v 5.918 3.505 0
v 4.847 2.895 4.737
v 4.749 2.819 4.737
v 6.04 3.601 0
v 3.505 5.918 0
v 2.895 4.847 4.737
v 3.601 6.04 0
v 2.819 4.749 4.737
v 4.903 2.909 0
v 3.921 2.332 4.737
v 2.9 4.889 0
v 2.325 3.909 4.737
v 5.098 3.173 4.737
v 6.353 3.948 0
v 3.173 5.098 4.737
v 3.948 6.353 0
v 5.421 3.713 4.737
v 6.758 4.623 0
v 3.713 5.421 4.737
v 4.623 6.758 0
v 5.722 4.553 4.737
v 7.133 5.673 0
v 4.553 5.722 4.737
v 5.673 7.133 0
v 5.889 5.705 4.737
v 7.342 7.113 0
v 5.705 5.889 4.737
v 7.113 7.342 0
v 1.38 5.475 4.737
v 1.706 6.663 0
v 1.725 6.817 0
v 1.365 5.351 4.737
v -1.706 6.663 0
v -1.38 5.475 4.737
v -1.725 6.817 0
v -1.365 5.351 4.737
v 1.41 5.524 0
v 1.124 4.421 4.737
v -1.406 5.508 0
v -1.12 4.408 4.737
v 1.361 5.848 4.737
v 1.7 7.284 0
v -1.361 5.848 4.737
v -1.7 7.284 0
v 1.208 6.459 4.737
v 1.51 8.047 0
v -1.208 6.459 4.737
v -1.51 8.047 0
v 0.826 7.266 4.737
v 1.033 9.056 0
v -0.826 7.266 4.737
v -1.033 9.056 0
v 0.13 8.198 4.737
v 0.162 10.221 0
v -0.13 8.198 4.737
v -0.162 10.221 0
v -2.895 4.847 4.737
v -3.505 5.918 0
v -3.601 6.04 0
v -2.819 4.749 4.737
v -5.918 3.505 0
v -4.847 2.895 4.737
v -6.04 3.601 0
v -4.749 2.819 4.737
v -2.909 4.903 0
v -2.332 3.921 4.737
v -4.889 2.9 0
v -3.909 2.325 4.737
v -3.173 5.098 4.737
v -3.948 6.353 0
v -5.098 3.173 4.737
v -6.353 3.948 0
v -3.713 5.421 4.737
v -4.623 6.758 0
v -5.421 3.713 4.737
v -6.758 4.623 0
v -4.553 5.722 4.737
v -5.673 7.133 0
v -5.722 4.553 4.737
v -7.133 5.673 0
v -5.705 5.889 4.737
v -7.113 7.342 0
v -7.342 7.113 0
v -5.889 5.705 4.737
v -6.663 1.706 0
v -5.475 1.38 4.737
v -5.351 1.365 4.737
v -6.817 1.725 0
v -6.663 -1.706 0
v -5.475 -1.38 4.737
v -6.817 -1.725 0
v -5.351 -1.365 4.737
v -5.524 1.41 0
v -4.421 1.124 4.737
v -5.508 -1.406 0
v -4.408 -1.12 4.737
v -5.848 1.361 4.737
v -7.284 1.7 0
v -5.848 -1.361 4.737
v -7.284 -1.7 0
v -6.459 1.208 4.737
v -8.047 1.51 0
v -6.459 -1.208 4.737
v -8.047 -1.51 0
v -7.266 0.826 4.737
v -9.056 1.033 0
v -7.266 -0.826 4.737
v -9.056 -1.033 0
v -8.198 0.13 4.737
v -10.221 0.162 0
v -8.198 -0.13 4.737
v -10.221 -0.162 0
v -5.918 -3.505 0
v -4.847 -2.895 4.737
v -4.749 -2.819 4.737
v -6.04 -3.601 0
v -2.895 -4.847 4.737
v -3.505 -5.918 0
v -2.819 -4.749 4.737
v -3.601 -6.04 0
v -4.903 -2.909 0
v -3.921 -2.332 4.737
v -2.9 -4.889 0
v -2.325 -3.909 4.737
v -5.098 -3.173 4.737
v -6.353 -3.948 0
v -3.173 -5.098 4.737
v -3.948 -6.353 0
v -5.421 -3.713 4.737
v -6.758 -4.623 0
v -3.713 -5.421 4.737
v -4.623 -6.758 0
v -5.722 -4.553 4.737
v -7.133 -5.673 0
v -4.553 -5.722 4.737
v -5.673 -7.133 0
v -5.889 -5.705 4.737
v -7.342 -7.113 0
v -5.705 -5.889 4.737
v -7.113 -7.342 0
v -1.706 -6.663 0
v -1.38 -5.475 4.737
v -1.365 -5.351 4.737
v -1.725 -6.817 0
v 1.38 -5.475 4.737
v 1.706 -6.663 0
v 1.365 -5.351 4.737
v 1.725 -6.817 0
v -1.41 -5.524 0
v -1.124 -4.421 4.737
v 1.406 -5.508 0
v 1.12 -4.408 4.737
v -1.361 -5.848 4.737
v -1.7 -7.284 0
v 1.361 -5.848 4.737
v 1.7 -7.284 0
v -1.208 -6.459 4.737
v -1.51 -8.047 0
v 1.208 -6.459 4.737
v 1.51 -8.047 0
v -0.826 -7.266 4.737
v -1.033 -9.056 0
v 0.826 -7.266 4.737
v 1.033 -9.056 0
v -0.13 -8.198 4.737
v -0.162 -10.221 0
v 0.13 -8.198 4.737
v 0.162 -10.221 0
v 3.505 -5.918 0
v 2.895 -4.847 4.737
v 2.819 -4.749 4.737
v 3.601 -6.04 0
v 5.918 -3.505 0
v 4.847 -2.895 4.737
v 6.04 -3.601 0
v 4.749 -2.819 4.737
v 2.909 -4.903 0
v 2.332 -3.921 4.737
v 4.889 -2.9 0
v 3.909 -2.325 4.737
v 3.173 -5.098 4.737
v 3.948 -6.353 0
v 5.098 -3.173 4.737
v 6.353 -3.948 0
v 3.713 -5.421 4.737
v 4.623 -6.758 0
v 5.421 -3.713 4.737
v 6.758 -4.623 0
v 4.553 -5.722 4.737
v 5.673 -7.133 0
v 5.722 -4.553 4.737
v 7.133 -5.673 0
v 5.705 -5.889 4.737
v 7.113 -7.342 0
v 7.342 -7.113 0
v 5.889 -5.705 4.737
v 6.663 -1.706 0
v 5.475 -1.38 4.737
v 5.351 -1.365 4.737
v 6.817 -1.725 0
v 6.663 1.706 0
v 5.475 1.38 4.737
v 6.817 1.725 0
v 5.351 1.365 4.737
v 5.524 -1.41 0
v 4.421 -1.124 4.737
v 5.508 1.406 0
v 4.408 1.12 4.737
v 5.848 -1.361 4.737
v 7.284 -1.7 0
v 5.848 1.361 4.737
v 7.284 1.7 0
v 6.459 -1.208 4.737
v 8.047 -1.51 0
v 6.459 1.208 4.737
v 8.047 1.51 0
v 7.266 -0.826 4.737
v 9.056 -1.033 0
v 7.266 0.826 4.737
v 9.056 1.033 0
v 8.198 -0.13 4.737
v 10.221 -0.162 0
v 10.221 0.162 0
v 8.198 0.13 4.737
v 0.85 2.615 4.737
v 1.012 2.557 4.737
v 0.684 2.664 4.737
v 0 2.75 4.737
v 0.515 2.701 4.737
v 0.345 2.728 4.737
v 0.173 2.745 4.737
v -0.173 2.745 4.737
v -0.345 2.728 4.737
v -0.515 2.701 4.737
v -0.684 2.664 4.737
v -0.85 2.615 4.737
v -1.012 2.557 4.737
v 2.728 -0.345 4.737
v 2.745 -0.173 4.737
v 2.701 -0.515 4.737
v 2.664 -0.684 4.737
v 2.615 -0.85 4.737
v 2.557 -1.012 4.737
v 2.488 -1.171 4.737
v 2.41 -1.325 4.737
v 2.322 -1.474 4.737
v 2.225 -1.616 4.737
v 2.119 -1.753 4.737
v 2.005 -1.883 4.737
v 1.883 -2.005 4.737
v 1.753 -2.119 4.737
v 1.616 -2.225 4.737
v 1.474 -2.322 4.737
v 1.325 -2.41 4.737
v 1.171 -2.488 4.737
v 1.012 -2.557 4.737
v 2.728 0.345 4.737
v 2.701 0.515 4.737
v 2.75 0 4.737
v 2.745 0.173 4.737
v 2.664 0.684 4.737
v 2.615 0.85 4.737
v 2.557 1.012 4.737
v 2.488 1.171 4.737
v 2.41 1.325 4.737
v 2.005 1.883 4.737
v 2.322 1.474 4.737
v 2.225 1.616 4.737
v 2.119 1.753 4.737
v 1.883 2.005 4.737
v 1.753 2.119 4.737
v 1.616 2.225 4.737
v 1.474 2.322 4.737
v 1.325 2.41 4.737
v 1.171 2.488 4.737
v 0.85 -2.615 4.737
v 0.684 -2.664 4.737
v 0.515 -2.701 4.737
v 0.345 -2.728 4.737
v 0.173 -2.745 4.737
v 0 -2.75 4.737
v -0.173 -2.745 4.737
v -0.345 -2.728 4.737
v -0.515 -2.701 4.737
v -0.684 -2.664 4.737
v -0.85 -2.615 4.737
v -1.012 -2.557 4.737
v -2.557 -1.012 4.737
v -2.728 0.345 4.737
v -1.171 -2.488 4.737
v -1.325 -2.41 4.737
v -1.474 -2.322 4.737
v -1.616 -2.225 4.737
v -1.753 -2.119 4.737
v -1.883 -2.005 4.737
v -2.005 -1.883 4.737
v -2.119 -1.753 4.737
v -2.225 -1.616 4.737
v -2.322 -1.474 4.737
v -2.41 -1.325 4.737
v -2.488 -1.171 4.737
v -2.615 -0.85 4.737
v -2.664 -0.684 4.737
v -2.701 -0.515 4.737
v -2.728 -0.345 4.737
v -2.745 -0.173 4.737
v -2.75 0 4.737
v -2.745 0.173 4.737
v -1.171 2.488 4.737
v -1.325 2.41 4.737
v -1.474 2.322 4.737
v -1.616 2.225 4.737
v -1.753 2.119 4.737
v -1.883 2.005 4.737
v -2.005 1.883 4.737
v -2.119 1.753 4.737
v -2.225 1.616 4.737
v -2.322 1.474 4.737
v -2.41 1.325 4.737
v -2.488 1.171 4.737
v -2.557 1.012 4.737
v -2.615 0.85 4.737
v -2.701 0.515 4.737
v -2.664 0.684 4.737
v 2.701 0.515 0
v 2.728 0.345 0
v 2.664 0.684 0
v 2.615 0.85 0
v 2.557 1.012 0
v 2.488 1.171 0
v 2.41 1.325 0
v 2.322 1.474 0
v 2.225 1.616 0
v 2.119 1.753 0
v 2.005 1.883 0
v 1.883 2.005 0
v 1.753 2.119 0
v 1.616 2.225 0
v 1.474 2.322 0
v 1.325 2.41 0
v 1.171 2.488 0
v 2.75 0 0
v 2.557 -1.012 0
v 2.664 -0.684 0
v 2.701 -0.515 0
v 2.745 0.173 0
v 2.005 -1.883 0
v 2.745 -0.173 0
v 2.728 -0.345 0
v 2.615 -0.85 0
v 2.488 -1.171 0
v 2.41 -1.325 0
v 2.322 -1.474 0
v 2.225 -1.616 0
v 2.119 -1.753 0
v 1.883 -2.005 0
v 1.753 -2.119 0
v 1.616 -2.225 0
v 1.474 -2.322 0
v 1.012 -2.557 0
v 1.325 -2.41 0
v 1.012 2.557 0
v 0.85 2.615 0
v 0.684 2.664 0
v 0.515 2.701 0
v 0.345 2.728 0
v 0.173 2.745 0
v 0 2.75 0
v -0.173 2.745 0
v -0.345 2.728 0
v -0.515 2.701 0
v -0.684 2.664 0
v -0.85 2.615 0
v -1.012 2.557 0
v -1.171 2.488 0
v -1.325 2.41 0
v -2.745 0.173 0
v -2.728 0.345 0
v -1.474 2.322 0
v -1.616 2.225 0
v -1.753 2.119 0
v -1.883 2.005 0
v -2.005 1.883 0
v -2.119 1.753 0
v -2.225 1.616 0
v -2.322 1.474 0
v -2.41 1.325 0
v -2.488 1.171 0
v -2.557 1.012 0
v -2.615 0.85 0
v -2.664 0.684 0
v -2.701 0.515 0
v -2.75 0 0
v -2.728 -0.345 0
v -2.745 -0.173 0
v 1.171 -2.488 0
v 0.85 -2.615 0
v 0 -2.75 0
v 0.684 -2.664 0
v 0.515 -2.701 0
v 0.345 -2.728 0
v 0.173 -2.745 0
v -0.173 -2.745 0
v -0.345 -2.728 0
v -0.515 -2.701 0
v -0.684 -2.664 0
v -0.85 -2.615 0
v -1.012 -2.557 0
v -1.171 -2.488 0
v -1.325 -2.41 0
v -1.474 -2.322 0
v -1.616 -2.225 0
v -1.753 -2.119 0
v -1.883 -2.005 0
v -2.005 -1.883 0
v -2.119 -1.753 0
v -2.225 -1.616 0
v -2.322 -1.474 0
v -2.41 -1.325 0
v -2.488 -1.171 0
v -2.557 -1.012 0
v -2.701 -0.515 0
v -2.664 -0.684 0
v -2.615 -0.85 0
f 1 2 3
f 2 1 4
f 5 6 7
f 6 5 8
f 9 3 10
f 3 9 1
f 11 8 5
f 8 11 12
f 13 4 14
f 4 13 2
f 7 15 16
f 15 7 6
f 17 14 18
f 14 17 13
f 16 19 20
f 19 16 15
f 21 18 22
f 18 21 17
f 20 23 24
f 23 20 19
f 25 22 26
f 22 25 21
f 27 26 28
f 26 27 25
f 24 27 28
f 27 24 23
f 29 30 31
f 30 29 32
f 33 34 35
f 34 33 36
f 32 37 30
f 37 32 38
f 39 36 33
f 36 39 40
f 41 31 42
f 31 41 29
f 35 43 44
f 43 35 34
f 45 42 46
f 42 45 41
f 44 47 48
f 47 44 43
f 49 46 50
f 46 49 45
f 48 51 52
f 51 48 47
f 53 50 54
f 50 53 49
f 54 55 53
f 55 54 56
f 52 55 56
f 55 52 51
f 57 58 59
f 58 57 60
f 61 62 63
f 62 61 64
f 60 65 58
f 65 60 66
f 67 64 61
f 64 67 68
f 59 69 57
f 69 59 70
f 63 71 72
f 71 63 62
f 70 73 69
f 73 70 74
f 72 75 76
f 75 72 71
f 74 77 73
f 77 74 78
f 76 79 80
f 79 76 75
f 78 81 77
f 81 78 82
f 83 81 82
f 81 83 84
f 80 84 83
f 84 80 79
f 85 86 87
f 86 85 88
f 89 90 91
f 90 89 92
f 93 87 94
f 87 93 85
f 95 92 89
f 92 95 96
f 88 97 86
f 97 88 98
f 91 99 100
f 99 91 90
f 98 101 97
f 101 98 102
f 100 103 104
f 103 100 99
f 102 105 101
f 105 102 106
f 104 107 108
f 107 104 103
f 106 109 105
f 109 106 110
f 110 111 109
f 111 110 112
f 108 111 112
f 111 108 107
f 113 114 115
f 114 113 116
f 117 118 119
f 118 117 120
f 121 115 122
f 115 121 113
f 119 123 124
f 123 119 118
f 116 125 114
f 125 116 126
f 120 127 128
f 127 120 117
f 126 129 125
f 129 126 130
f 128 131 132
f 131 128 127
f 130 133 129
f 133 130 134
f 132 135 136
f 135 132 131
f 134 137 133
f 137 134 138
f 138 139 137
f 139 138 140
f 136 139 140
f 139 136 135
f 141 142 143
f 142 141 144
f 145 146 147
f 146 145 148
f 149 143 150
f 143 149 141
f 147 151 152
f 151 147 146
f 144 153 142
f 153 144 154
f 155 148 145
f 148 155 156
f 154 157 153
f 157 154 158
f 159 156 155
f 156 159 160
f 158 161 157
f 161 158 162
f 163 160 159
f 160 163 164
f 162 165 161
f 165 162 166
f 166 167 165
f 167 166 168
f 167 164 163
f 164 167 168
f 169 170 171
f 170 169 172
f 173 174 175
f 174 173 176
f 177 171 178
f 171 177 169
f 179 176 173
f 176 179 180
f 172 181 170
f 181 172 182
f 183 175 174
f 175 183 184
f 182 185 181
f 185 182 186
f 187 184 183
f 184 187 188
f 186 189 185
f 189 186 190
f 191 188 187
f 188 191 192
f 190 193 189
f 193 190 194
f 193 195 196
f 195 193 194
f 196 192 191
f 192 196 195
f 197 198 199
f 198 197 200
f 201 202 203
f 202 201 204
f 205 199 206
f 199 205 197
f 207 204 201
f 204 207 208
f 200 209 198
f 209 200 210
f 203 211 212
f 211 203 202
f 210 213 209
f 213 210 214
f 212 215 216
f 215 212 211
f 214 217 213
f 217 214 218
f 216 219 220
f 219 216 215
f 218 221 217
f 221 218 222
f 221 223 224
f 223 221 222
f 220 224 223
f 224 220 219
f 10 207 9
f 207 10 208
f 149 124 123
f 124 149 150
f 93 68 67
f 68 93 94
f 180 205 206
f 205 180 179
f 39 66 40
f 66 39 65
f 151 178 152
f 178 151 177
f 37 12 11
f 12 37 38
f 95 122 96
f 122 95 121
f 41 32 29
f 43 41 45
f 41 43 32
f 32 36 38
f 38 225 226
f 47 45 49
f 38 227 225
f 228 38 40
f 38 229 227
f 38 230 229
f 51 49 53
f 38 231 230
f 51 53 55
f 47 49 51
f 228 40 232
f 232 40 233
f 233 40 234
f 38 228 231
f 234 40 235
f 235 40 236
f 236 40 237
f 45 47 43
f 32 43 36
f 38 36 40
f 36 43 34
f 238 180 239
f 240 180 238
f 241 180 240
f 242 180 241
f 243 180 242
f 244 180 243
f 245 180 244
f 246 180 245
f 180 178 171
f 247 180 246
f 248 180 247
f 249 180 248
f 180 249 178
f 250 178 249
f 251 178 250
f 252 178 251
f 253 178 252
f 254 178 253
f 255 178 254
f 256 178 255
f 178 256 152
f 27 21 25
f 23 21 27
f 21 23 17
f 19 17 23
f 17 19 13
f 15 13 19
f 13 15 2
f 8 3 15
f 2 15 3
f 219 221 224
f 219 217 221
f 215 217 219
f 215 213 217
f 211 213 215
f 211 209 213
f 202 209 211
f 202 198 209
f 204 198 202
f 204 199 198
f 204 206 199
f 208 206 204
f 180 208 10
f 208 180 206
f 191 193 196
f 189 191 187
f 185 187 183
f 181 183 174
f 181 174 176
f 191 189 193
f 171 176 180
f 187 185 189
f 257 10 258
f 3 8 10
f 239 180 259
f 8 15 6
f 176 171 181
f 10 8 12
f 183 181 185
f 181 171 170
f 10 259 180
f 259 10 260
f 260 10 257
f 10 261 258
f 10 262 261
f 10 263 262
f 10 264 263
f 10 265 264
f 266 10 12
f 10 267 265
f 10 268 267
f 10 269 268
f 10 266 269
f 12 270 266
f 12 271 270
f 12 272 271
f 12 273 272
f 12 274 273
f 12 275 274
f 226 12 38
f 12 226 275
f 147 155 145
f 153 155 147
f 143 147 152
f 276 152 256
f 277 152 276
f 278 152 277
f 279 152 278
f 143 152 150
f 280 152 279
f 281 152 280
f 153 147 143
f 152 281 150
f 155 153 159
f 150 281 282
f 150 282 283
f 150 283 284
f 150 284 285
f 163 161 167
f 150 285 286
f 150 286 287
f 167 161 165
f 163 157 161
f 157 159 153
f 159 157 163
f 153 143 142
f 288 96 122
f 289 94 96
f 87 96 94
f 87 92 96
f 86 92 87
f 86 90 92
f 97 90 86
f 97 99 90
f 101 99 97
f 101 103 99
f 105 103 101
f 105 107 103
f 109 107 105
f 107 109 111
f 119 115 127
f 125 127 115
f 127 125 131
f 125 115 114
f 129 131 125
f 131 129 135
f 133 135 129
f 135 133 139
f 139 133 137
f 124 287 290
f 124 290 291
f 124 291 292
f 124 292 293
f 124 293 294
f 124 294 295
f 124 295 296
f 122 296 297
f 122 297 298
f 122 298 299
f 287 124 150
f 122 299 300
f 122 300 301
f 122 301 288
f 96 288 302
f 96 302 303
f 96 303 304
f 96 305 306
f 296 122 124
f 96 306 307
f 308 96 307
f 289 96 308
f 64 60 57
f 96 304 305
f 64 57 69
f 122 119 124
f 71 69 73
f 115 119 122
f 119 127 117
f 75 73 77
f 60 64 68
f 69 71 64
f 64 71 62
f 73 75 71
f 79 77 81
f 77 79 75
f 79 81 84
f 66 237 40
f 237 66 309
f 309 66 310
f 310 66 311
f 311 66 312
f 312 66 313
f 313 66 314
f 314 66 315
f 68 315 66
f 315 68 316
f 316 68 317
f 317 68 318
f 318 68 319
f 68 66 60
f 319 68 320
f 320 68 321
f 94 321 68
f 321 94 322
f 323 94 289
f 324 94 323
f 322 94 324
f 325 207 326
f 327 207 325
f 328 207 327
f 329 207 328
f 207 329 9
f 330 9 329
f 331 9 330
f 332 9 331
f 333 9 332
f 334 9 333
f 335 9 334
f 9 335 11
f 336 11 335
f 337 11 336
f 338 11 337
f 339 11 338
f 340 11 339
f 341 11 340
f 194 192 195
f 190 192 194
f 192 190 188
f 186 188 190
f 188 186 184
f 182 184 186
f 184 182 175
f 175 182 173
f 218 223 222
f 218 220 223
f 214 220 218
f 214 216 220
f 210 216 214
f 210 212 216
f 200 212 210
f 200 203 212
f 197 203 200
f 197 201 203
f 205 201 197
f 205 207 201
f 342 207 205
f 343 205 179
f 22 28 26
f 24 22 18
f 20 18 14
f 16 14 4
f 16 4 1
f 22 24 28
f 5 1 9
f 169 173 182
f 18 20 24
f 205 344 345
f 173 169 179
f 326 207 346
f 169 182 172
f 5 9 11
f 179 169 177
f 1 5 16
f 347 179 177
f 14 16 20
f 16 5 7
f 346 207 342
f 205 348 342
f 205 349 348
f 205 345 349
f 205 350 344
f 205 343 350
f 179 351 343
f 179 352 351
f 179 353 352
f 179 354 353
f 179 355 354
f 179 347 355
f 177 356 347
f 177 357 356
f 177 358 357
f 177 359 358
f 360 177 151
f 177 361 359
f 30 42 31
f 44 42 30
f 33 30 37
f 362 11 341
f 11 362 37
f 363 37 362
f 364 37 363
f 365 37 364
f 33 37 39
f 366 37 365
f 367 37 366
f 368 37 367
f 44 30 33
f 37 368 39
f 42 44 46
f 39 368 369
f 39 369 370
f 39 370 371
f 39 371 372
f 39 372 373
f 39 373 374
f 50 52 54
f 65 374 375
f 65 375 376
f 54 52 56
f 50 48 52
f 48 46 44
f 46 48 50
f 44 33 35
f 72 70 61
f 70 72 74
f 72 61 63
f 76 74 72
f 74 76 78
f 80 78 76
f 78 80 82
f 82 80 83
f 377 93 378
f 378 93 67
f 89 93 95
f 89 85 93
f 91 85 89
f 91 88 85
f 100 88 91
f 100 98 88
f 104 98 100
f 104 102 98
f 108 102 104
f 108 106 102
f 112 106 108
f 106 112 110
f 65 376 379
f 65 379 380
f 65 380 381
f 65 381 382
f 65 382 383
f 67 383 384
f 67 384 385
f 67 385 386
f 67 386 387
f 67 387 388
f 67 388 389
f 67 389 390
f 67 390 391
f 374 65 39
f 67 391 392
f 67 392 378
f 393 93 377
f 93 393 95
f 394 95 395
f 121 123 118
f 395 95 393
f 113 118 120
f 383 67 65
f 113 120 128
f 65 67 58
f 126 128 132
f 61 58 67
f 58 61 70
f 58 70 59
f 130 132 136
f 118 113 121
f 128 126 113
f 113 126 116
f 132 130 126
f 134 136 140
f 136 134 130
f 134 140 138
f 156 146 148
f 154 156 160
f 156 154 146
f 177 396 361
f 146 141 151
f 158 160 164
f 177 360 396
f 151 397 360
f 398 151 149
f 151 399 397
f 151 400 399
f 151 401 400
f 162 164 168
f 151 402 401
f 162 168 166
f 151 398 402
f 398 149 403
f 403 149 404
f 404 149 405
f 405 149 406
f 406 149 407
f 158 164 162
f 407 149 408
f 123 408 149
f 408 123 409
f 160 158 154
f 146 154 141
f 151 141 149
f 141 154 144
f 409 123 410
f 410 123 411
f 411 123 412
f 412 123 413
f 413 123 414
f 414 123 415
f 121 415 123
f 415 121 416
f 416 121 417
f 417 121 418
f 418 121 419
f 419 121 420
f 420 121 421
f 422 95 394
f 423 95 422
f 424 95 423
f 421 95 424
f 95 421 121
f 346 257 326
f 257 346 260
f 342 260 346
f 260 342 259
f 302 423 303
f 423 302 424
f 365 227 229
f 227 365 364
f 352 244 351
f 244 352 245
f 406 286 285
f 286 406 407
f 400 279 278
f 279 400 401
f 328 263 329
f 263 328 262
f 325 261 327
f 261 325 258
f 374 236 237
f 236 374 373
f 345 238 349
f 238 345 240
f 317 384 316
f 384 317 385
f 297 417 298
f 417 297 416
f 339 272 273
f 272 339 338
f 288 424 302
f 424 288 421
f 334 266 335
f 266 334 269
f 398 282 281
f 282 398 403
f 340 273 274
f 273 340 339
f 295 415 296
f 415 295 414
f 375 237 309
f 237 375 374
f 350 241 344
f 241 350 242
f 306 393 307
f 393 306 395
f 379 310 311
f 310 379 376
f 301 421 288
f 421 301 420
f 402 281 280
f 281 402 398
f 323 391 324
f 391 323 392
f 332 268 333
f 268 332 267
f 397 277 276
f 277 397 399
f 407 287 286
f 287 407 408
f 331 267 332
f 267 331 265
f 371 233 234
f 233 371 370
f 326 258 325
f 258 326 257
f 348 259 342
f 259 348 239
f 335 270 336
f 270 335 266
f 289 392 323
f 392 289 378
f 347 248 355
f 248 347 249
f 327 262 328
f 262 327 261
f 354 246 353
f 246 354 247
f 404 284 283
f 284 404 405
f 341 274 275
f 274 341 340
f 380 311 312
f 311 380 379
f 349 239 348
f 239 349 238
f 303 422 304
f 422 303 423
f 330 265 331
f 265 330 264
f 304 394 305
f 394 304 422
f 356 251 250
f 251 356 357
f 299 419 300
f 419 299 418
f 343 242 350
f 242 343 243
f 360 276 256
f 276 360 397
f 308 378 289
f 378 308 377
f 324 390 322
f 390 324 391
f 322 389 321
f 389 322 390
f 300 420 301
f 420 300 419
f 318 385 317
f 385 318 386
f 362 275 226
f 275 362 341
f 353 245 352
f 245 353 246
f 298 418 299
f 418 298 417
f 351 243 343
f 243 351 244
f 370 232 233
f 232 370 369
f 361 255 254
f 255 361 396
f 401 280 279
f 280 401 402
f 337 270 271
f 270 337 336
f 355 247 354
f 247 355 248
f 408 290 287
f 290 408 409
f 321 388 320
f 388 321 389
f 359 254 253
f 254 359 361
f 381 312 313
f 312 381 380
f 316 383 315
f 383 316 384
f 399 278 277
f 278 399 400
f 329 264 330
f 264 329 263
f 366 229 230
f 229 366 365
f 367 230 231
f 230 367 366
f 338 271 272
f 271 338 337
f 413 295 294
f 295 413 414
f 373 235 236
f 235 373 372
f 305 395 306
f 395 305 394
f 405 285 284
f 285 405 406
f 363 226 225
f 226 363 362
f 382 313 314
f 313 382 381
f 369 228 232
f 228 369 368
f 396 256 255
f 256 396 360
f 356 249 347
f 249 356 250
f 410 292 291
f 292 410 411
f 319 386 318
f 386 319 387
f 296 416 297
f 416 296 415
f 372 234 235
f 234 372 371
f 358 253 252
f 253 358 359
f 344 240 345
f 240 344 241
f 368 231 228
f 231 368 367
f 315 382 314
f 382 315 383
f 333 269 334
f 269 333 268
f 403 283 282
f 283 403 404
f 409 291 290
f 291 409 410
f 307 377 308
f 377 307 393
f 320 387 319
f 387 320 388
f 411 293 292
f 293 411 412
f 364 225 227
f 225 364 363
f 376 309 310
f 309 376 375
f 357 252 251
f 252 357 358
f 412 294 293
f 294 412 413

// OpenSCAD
// file: lib/bevel_gear_lib.scad
// Parametric Involute Bevel and Spur Gears by GregFrost
// It is licensed under the Creative Commons - GNU GPL license.
// © 2010 by GregFrost
// http://www.thingiverse.com/thing:3575

//Bevel Gear Finishing Options:
bevel_gear_flat = 0;
bevel_gear_back_cone = 1;

module bevel_gear (
	number_of_teeth=11,
	cone_distance=100,
	face_width=20,
	outside_circular_pitch=1000,
	pressure_angle=30,
	clearance = 0.2,
	bore_diameter=5,
	gear_thickness = 15,
	backlash = 0,
	involute_facets=0,
	finish = 0)
{
	echo ("bevel_gear",
		"teeth", number_of_teeth,
		"cone distance", cone_distance,
		face_width,
		outside_circular_pitch,
		pressure_angle,
		clearance,
		bore_diameter,
		involute_facets,
		finish);

	// Pitch diameter: Diameter of pitch circle at the fat end of the gear.
	outside_pitch_diameter  =  number_of_teeth * outside_circular_pitch / 180;
	outside_pitch_radius = outside_pitch_diameter / 2;

	// The height of the pitch apex.
	pitch_apex = sqrt (pow (cone_distance, 2) - pow (outside_pitch_radius, 2));
	pitch_angle = asin (outside_pitch_radius/cone_distance);

	echo ("Num Teeth:", number_of_teeth, " Pitch Angle:", pitch_angle);

	finish = (finish != -1) ? finish : (pitch_angle < 45) ? bevel_gear_flat : bevel_gear_back_cone;

	apex_to_apex=cone_distance / cos (pitch_angle);
	back_cone_radius = apex_to_apex * sin (pitch_angle);

	// Calculate and display the pitch angle. This is needed to determine the angle to mount two meshing cone gears.

	// Base Circle for forming the involute teeth shape.
	base_radius = back_cone_radius * cos (pressure_angle);	

	// Diametrial pitch: Number of teeth per unit length.
	pitch_diametrial = number_of_teeth / outside_pitch_diameter;

	// Addendum: Radial distance from pitch circle to outside circle.
	addendum = 1 / pitch_diametrial;
	// Outer Circle
	outer_radius = back_cone_radius + addendum;

	// Dedendum: Radial distance from pitch circle to root diameter
	dedendum = addendum + clearance;
	dedendum_angle = atan (dedendum / cone_distance);
	root_angle = pitch_angle - dedendum_angle;

	root_cone_full_radius = tan (root_angle)*apex_to_apex;
	back_cone_full_radius=apex_to_apex / tan (pitch_angle);

	back_cone_end_radius = 
		outside_pitch_radius - 
		dedendum * cos (pitch_angle) - 
		gear_thickness / tan (pitch_angle);
	back_cone_descent = dedendum * sin (pitch_angle) + gear_thickness;

	// Root diameter: Diameter of bottom of tooth spaces.
	root_radius = back_cone_radius - dedendum;

	half_tooth_thickness = outside_pitch_radius * sin (360 / (4 * number_of_teeth)) - backlash / 4;
	half_thick_angle = asin (half_tooth_thickness / back_cone_radius);

	face_cone_height = apex_to_apex-face_width / cos (pitch_angle);
	face_cone_full_radius = face_cone_height / tan (pitch_angle);
	face_cone_descent = dedendum * sin (pitch_angle);
	face_cone_end_radius = 
		outside_pitch_radius -
		face_width / sin (pitch_angle) - 
		face_cone_descent / tan (pitch_angle);

	// For the bevel_gear_flat finish option, calculate the height of a cube to select the portion of the gear that includes the full pitch face.
	bevel_gear_flat_height = pitch_apex - (cone_distance - face_width) * cos (pitch_angle);

//	translate([0,0,-pitch_apex])
	difference ()
	{
		intersection ()
		{
			union()
			{
				rotate (half_thick_angle)
				translate ([0,0,pitch_apex-apex_to_apex])
				cylinder ($fn=number_of_teeth*2, r1=root_cone_full_radius,r2=0,h=apex_to_apex);
				for (i = [1:number_of_teeth])
//				for (i = [1:1])
				{
					rotate ([0,0,i*360/number_of_teeth])
					{
						involute_bevel_gear_tooth (
							back_cone_radius = back_cone_radius,
							root_radius = root_radius,
							base_radius = base_radius,
							outer_radius = outer_radius,
							pitch_apex = pitch_apex,
							cone_distance = cone_distance,
							half_thick_angle = half_thick_angle,
							involute_facets = involute_facets);
					}
				}
			}

			if (finish == bevel_gear_back_cone)
			{
				translate ([0,0,-back_cone_descent])
				cylinder (
					$fn=number_of_teeth*2, 
					r1=back_cone_end_radius,
					r2=back_cone_full_radius*2,
					h=apex_to_apex + back_cone_descent);
			}
			else
			{
				translate ([-1.5*outside_pitch_radius,-1.5*outside_pitch_radius,0])
				cube ([3*outside_pitch_radius,
					3*outside_pitch_radius,
					bevel_gear_flat_height]);
			}
		}
		
		if (finish == bevel_gear_back_cone)
		{
			translate ([0,0,-face_cone_descent])
			cylinder (
				r1=face_cone_end_radius,
				r2=face_cone_full_radius * 2,
				h=face_cone_height + face_cone_descent+pitch_apex);
		}

		translate ([0,0,pitch_apex - apex_to_apex])
		cylinder (r=bore_diameter/2,h=apex_to_apex, $fn=100);
	}	
}

module involute_bevel_gear_tooth (
	back_cone_radius,
	root_radius,
	base_radius,
	outer_radius,
	pitch_apex,
	cone_distance,
	half_thick_angle,
	involute_facets)
{
//	echo ("involute_bevel_gear_tooth",
//		back_cone_radius,
//		root_radius,
//		base_radius,
//		outer_radius,
//		pitch_apex,
//		cone_distance,
//		half_thick_angle);

	min_radius = max (base_radius*2,root_radius*2);

	pitch_point = 
		involute (
			base_radius*2, 
			involute_intersect_angle (base_radius*2, back_cone_radius*2));
	pitch_angle = atan2 (pitch_point[1], pitch_point[0]);
	centre_angle = pitch_angle + half_thick_angle;

	start_angle = involute_intersect_angle (base_radius*2, min_radius);
	stop_angle = involute_intersect_angle (base_radius*2, outer_radius*2);

	res=(involute_facets!=0)?involute_facets:($fn==0)?5:$fn/4;

	translate ([0,0,pitch_apex])
	rotate ([0,-atan(back_cone_radius/cone_distance),0])
	translate ([-back_cone_radius*2,0,-cone_distance*2])
	union ()
	{
		for (i=[1:res])
		{
			assign (
				point1=
					involute (base_radius*2,start_angle+(stop_angle - start_angle)*(i-1)/res),
				point2=
					involute (base_radius*2,start_angle+(stop_angle - start_angle)*(i)/res))
			{
				assign (
					side1_point1 = rotate_point (centre_angle, point1),
					side1_point2 = rotate_point (centre_angle, point2),
					side2_point1 = mirror_point (rotate_point (centre_angle, point1)),
					side2_point2 = mirror_point (rotate_point (centre_angle, point2)))
				{
					polyhedron (
						points=[
							[back_cone_radius*2+0.1,0,cone_distance*2],
							[side1_point1[0],side1_point1[1],0],
							[side1_point2[0],side1_point2[1],0],
							[side2_point2[0],side2_point2[1],0],
							[side2_point1[0],side2_point1[1],0],
							[0.1,0,0]],
						triangles=[[0,1,2],[0,2,3],[0,3,4],[0,5,1],[1,5,2],[2,5,3],[3,5,4],[0,4,5]]);
				}
			}
		}
	}
}

// Mathematical Functions
//===============

pi=3.1415926535897932384626433832795;

// Finds the angle of the involute about the base radius at the given distance (radius) from it's center.
//source: http://www.mathhelpforum.com/math-help/geometry/136011-circle-involute-solving-y-any-given-x.html

function involute_intersect_angle (base_radius, radius) = sqrt (pow (radius/base_radius, 2) - 1) * 180 / pi;

// Calculate the involute position for a given base radius and involute angle.

function rotated_involute (rotate, base_radius, involute_angle) = 
[
	cos (rotate) * involute (base_radius, involute_angle)[0] + sin (rotate) * involute (base_radius, involute_angle)[1],
	cos (rotate) * involute (base_radius, involute_angle)[1] - sin (rotate) * involute (base_radius, involute_angle)[0]
];

function mirror_point (coord) = 
[
	coord[0], 
	-coord[1]
];

function rotate_point (rotate, coord) =
[
	cos (rotate) * coord[0] + sin (rotate) * coord[1],
	cos (rotate) * coord[1] - sin (rotate) * coord[0]
];

function involute (base_radius, involute_angle) = 
[
	base_radius*(cos (involute_angle) + involute_angle*pi/180*sin (involute_angle)),
	base_radius*(sin (involute_angle) - involute_angle*pi/180*cos (involute_angle)),
];
// file: lib/gear_lib.scad
//////////////////////////////////////////////////////////////////////////////////////////////
// Public Domain Parametric Involute Spur Gear (and involute helical gear and involute rack)
// version 1.1
// by Leemon Baird, 2011, Leemon@Leemon.com
//http://www.thingiverse.com/thing:5505
//
// This file is public domain.  Use it for any purpose, including commercial
// applications.  Attribution would be nice, but is not required.  There is
// no warranty of any kind, including its correctness, usefulness, or safety.
// 
// This is parameterized involute spur (or helical) gear.  It is much simpler and less powerful than
// others on Thingiverse.  But it is public domain.  I implemented it from scratch from the 
// descriptions and equations on Wikipedia and the web, using Mathematica for calculations and testing,
// and I now release it into the public domain.
//
//		http://en.wikipedia.org/wiki/Involute_gear
//		http://en.wikipedia.org/wiki/Gear
//		http://en.wikipedia.org/wiki/List_of_gear_nomenclature
//		http://gtrebaol.free.fr/doc/catia/spur_gear.html
//		http://www.cs.cmu.edu/~rapidproto/mechanisms/chpt7.html
//
// The module gear() gives an involute spur gear, with reasonable defaults for all the parameters.
// Normally, you should just choose the first 4 parameters, and let the rest be default values.
// The module gear() gives a gear in the XY plane, centered on the origin, with one tooth centered on
// the positive Y axis.  The various functions below it take the same parameters, and return various
// measurements for the gear.  The most important is pitch_radius, which tells how far apart to space
// gears that are meshing, and adendum_radius, which gives the size of the region filled by the gear.
// A gear has a "pitch circle", which is an invisible circle that cuts through the middle of each
// tooth (though not the exact center). In order for two gears to mesh, their pitch circles should 
// just touch.  So the distance between their centers should be pitch_radius() for one, plus pitch_radius() 
// for the other, which gives the radii of their pitch circles.
//
// In order for two gears to mesh, they must have the same mm_per_tooth and pressure_angle parameters.  
// mm_per_tooth gives the number of millimeters of arc around the pitch circle covered by one tooth and one
// space between teeth.  The pitch angle controls how flat or bulged the sides of the teeth are.  Common
// values include 14.5 degrees and 20 degrees, and occasionally 25.  Though I've seen 28 recommended for
// plastic gears. Larger numbers bulge out more, giving stronger teeth, so 28 degrees is the default here.
//
// The ratio of number_of_teeth for two meshing gears gives how many times one will make a full 
// revolution when the the other makes one full revolution.  If the two numbers are coprime (i.e. 
// are not both divisible by the same number greater than 1), then every tooth on one gear
// will meet every tooth on the other, for more even wear.  So coprime numbers of teeth are good.
//
// The module rack() gives a rack, which is a bar with teeth.  A rack can mesh with any
// gear that has the same mm_per_tooth and pressure_angle.
//
// Some terminology: 
// The outline of a gear is a smooth circle (the "pitch circle") which has mountains and valleys
// added so it is toothed.  So there is an inner circle (the "root circle") that touches the 
// base of all the teeth, an outer circle that touches the tips of all the teeth,
// and the invisible pitch circle in between them.  There is also a "base circle", which can be smaller than
// all three of the others, which controls the shape of the teeth.  The side of each tooth lies on the path 
// that the end of a string would follow if it were wrapped tightly around the base circle, then slowly unwound.  
// That shape is an "involute", which gives this type of gear its name.
//
//////////////////////////////////////////////////////////////////////////////////////////////

//An involute spur gear, with reasonable defaults for all the parameters.
//Normally, you should just choose the first 4 parameters, and let the rest be default values.
//Meshing gears must match in mm_per_tooth, pressure_angle, and twist,
//and be separated by the sum of their pitch radii, which can be found with pitch_radius().
module gear (
	mm_per_tooth    = 3,    //this is the "circular pitch", the circumference of the pitch circle divided by the number of teeth
	number_of_teeth = 11,   //total number of teeth around the entire perimeter
	thickness       = 6,    //thickness of gear in mm
	hole_diameter   = 3,    //diameter of the hole in the center, in mm
	twist           = 0,    //teeth rotate this many degrees from bottom of gear to top.  360 makes the gear a screw with each thread going around once
	teeth_to_hide   = 0,    //number of teeth to delete to make this only a fraction of a circle
	pressure_angle  = 28,   //Controls how straight or bulged the tooth sides are. In degrees.
	clearance       = 0.0,  //gap between top of a tooth on one gear and bottom of valley on a meshing gear (in millimeters)
	backlash        = 0.0   //gap between two meshing teeth, in the direction along the circumference of the pitch circle
) {
	assign(pi = 3.1415926)
	assign(p  = mm_per_tooth * number_of_teeth / pi / 2)  //radius of pitch circle
	assign(c  = p + mm_per_tooth / pi - clearance)        //radius of outer circle
	assign(b  = p*cos(pressure_angle))                    //radius of base circle
	assign(r  = p-(c-p)-clearance)                        //radius of root circle
	assign(t  = mm_per_tooth/2-backlash/2)                //tooth thickness at pitch circle
	assign(k  = -iang(b, p) - t/2/p/pi*180) {             //angle to where involute meets base circle on each side of tooth
		difference() {
			for (i = [0:number_of_teeth-teeth_to_hide-1] )
				rotate([0,0,i*360/number_of_teeth])
					linear_extrude(height = thickness, center = true, convexity = 10, twist = twist)
						polygon(
							points=[
								[0, -hole_diameter/10],
								polar(r, -181/number_of_teeth),
								polar(r, r<b ? k : -180/number_of_teeth),
								q7(0/5,r,b,c,k, 1),q7(1/5,r,b,c,k, 1),q7(2/5,r,b,c,k, 1),q7(3/5,r,b,c,k, 1),q7(4/5,r,b,c,k, 1),q7(5/5,r,b,c,k, 1),
								q7(5/5,r,b,c,k,-1),q7(4/5,r,b,c,k,-1),q7(3/5,r,b,c,k,-1),q7(2/5,r,b,c,k,-1),q7(1/5,r,b,c,k,-1),q7(0/5,r,b,c,k,-1),
								polar(r, r<b ? -k : 180/number_of_teeth),
								polar(r, 181/number_of_teeth)
							],
 							paths=[[0,1,2,3,4,5,6,7,8,9,10,11,12,13,14,15,16]]
						);
			cylinder(h=2*thickness+1, r=hole_diameter/2, center=true, $fn=100);
		}
	}
};	
//these 4 functions are used by gear
function polar(r,theta)   = r*[sin(theta), cos(theta)];                            //convert polar to cartesian coordinates
function iang(r1,r2)      = sqrt((r2/r1)*(r2/r1) - 1)/3.1415926*180 - acos(r1/r2); //unwind a string this many degrees to go from radius r1 to radius r2
function q7(f,r,b,r2,t,s) = q6(b,s,t,(1-f)*max(b,r)+f*r2);                         //radius a fraction f up the curved side of the tooth 
function q6(b,s,t,d)      = polar(d,s*(iang(b,d)+t));                              //point at radius d on the involute curve

function pitch_radius    (mm_per_tooth=3,number_of_teeth=11) = mm_per_tooth * number_of_teeth / 3.1415926 / 2;
// main file
use <lib/gear_lib.scad>
use <lib/bevel_gear_lib.scad>

/*************************************************
Gear ratios - 1:2 and 1:5. The smaller of the 1:5
ratio gears doesn't need to be the same number of
teeth as the smaller of the 1:2
*************************************************/
teeth_1_to_2_small = 9;
teeth_1_to_2_large = 18;

bevel_teeth_1_to_2_small = 8;
bevel_teeth_1_to_2_large = 16;

teeth_1_to_5_small = 7;
teeth_1_to_5_large = 35;

mm_per_tooth = 5;
gear_thickness = 4;

/*************************************************
Shaft variables. Designed around a 3/16" steel rod
*************************************************/
gear_shaft_diameter = (3/16) * 25.4;
free_shaft_diameter = (3/16) * 25.4 * 1.1;

/*************************************************
Frame variables
*************************************************/
frame_width = 85;
frame_height = 55;
wall_thickness = 3;
corner_radius = 3;
gear_wall_clearance = 0.75;
camera_mount_retainer_thickness = 2;

/*************************************************
Stepper motor dimensions. Designed around a NEMA14
stepper motor.
*************************************************/
stepper_height = 34;
stepper_shaft_height = 24;
stepper_shaft_diameter = 5;
stepper_width = 42.3;
stepper_y_offset = 25 - frame_height;

/*************************************************
Modeling control. Setting model_full_assembly to
true will ignore the rest of the individual model
variables. The individually modeled pieces are all
centered at [0,0,0] so it's probably best to
render them one at a time, export the model, then
go on to the next one.
*************************************************/
model_full_assembly         = false;
model_compound_1_to_2_gear  = false;
model_compound_1_to_5_gear  = false;
model_compound_bevel_gear   = false;
model_compound_1_2_gear_ext = false;
model_compound_1_5_gear_ext = false;
model_camera_mount_gear     = false;
model_driver_gear           = true;
model_frame                 = false;

/*************************************************
END CONTROL VARIABLES
*************************************************/

cylinder_resolution = 100;

if (model_full_assembly)
{
    full_assembly();
}
else
{
    if (model_compound_1_to_2_gear)
    {
        gear_1_to_2_large();
        translate([0, 0, gear_thickness])
        {
            gear_1_to_2_small();
        }
    }
    if (model_compound_1_to_5_gear)
    {
        gear_1_to_5_large();
        translate([0, 0, gear_thickness])
        {
            gear_1_to_5_small();
        }
    }
    if (model_compound_bevel_gear)
    {
        compound_bevel_gear();
    }
    if (model_compound_1_2_gear_ext)
    {
        rotate([180, 0, 0])
        {
            compound_1_2_gear_ext();
        }
    }
    if (model_compound_1_5_gear_ext)
    {
        rotate([180, 0, 0])
        {
            compound_1_5_gear_ext();
        }
    }
    if (model_camera_mount_gear)
    {
        camera_mount_gear();
    }
    if (model_frame)
    {
        rotate([90, 0, 0])
        {
            frame();
        }
    }
    if (model_driver_gear)
    {
        driver_gear();
    }
}

module driver_gear()
{
    bevel_gear(
        number_of_teeth = bevel_teeth_1_to_2_small,
        pressure_angle=30,
        cone_distance=25,
        outside_circular_pitch=360,
        bore_diameter = 5.5,
        face_width = 5,
        finish = 0);
}

module compound_bevel_gear()
{
    bevel_gear(
        number_of_teeth = bevel_teeth_1_to_2_large,
        pressure_angle = 30,
        cone_distance = 25,
        outside_circular_pitch = 360,
        bore_diameter = free_shaft_diameter,
        face_width = 5,
        finish = 0);

    translate([0, 0, -2])
    {
        gear_1_to_2_small();
    }
}

module compound_1_2_gear_ext()
{
    gear_1_to_2_large();
    translate([0, 0, -gear_thickness])
    {
        gear_1_to_5_small(gear_thickness);
    }
}

module compound_1_5_gear_ext()
{
    difference()
    {
        union()
        {
            gear_1_to_5_large();
            translate([0, 0, -gear_thickness])
            {
                gear_1_to_5_small(gear_thickness);
            }
        }
        // Smooth out the interior
        translate([0, 0, -20])
        {
            cylinder(r=free_shaft_diameter/2, h=30, $fn=cylinder_resolution);
        }
    }
}

module gear_1_to_2_small()
{
    gear(mm_per_tooth, teeth_1_to_2_small, gear_thickness, free_shaft_diameter);
}

function gear_shaft_radius() = pitch_radius(mm_per_tooth, teeth_1_to_5_small) + mm_per_tooth / 2;

module gear_1_to_5_small(additional_shaft_length = 0)
{
    translate([0, 0, -(additional_shaft_length / 2)])
    {
        difference()
        {
            cylinder(r=gear_shaft_radius(), h=additional_shaft_length, $fn=cylinder_resolution);
            translate([0, 0, -0.5])
            {
                cylinder(r=free_shaft_diameter/2,
                         h=additional_shaft_length + 1, $fn=cylinder_resolution);
            }
        }
    }
    translate([0, 0, -additional_shaft_length])
    {
        gear(mm_per_tooth, teeth_1_to_5_small, gear_thickness, free_shaft_diameter);
    }
}

module gear_1_to_2_large()
{
    // This isn't really necessary but it makes the render look nice
    rotate([0, 0, 5])
    {
        gear(mm_per_tooth, teeth_1_to_2_large, gear_thickness, free_shaft_diameter);
    }
}

module gear_1_to_5_large()
{
    rotate([0, 0, 5])
    {
        gear(mm_per_tooth, teeth_1_to_5_large, gear_thickness, free_shaft_diameter);
    }
}

module compound_gear_1_2()
{
    gear_1_to_2_large();
    translate([0, 0, -gear_thickness])
    {
        gear_1_to_2_small();
    }
}

module compound_gear_1_5()
{
    gear_1_to_5_large();
    translate([0, 0, -gear_thickness])
    {
        gear_1_to_5_small();
    }
}

module camera_mount_gear()
{
    small_screw_hole_diameter = 4.4;
    small_screw_hole_spacing = 14.2;

    $fn = cylinder_resolution;

    difference()
    {
        union()
        {
            gear_1_to_5_large();
            translate([0, 0, -gear_thickness/2 - camera_mount_retainer_thickness])
            {
                cylinder(r=compound_gear_1_5_dist() - 1, h=camera_mount_retainer_thickness);
            }
        }

        through_hole_height = camera_mount_retainer_thickness + gear_thickness + 1;
        translate([0, 0, -gear_thickness - 0.5])
        {
            translate([small_screw_hole_spacing / -2, 0, 0])
            {
                cylinder(r=small_screw_hole_diameter / 2, h=through_hole_height);
            }
            translate([0, 0, 0])
            {
                cylinder(r=free_shaft_diameter / 2, h=through_hole_height);
            }
            translate([small_screw_hole_spacing / 2, 0, 0])
            {
                cylinder(r=small_screw_hole_diameter / 2, h=through_hole_height);
            }
        }

        // M4 cap screw countersinks
        // This won't countersink the entire screw head, but there needs to be
        // enough plastic to not crush between the screw and the ball joint
        translate([0, 0, gear_thickness / 2 - 3])
        {
            translate([small_screw_hole_spacing / -2, 0, 0])
            {
                cylinder(r=7/2, h=through_hole_height);
            }
            translate([small_screw_hole_spacing / 2, 0, 0])
            {
                cylinder(r=7/2, h=through_hole_height);
            }
        }
    }
}

function compound_gear_1_2_dist() =
    pitch_radius(mm_per_tooth, teeth_1_to_2_large) +
    pitch_radius(mm_per_tooth, teeth_1_to_2_small);

function compound_gear_1_5_dist() =
    pitch_radius(mm_per_tooth, teeth_1_to_5_large) +
    pitch_radius(mm_per_tooth, teeth_1_to_5_small);

module full_assembly()
{
    // Driver gear
    rotate([-90, 0, 0])
    translate([0, -9, -16])
    {
        color("lightgray") driver_gear();

    }

    // Stepper motor - for rendering purposes only
    translate([-stepper_width / 2, stepper_y_offset - stepper_height, -9 - stepper_shaft_diameter / 2])
    {
        color("white") import("lib/9238.stl");
    }

    // First compound gear
    color("red") compound_bevel_gear();

    translate([ -1 * compound_gear_1_2_dist(), 0, -2])
    {
        // Second compound gear
        color("green") compound_gear_1_2();
    }

    translate([0, 0, -6])
    {
        // Third compound gear
        color("blue") compound_gear_1_2();

        // Last gear in this train is a compound of 1 : 2 and 1 : 5,
        // specifically thicker to make room for supporting the shaft
        // through compound gears 1 and 3
        translate([-1 * compound_gear_1_2_dist(), 0, -(gear_thickness)])
        {
            color("orange") compound_1_2_gear_ext();
        }
    }

    // Next train: 1 : 5 reducers

    // Line it up with the end of the 1 : 2 reducer train
    x_offset = -1 * compound_gear_1_2_dist();
    z_offset = -1 * (gear_thickness * 4 + gear_wall_clearance + wall_thickness);
    translate([x_offset, 0, z_offset])
    {
        // First compound gear
        translate([compound_gear_1_5_dist(), 0, 0])
        {
            color("purple") compound_gear_1_5();
        }

        // Second compound gear
        translate([0, 0, -gear_thickness])
        {
            color("salmon") compound_gear_1_5();
        }

        // Third compound gear
        translate([compound_gear_1_5_dist(), 0, -gear_thickness * 2])
        {
            color("aqua") compound_1_5_gear_ext();
        }

        translate([0, 0, -(gear_thickness * 4 + gear_wall_clearance)])
        {
            color("yellow") camera_mount_gear();
        }
    }

    // Drive shafts
    color("gray")
    {
        translate([-compound_gear_1_2_dist(), 0, -45])
        {
            cylinder(r=(gear_shaft_diameter / 2), h=55, $fn=cylinder_resolution);
        }

        translate([0, 0, -15])
        {
            cylinder(r=(gear_shaft_diameter / 2), h=23, $fn=cylinder_resolution);
        }

        translate([-compound_gear_1_2_dist() + compound_gear_1_5_dist(), 0, -36])
        {
            cylinder(r=(gear_shaft_diameter / 2), h=23, $fn=cylinder_resolution);
        }
    }

    frame();
}

module stepper_motor_mount()
{
    // A little extra on the cube cutouts so the motor
    // can actually fit into the space
    extra = 0.2;

    module stepper_motor_cube()
    {
        w = stepper_width + extra;
        cube([w, w, stepper_height]);
    }

    module stepper_motor_hole_pattern()
    {
        $fn = cylinder_resolution;
        offset = (42.3 - 31) / 2;
        screw_diameter = 3.2;   // M3s
        hole_height = 20;
        translate([extra / 2, extra / 2, -5])
        {
            for(x = [offset, stepper_width - offset])
            for(y = [offset, stepper_width - offset])
            {
                translate([x, y, 0])
                {
                    cylinder(r=screw_diameter / 2, h=hole_height);
                }
            }
            translate([stepper_width / 2, stepper_width / 2, -hole_height + 1])
            {
                cylinder(r=11.5, h=hole_height * 2);
            }
        }
    }

    stepper_motor_cube();
    stepper_motor_hole_pattern();
}

module frame()
{
    frame_x_offset = 30 - frame_width;
    frame_y_offset = 20 - frame_height;

    module rounded_wall(x, y, z)
    {
        hull()
        {
            translate([corner_radius, y - corner_radius, 0])
            {
                cylinder(r=corner_radius, h=z, $fn=cylinder_resolution);
            }
            translate([x - corner_radius, y - corner_radius, 0])
            {
                cylinder(r=corner_radius, h=z, $fn=cylinder_resolution);
            }
            cube([x, y / 2, z]);
        }
    }

    module free_shaft_cutout()
    {
        translate([0, 0, -0.5])
        {
            cylinder(r=free_shaft_diameter / 2, h=wall_thickness + 1, $fn=cylinder_resolution);
        }
    }

    module gear_shaft_cutout()
    {
        translate([0, 0, -0.5])
        {
            // Add 0.15 to the radius for a little bit of slack. It's really
            // hard to ream out the gear shaft cutout in the center wall!
            shaft_radius = gear_shaft_radius() + 0.15;
            cylinder(r=shaft_radius + gear_wall_clearance / 2,
                     h=wall_thickness + 1, $fn=cylinder_resolution);
        }
    }

    // First shaft support wall
    module first_shaft_support_wall()
    {
        first_wall_z_offset = gear_thickness;
        translate([0, 0, first_wall_z_offset + gear_wall_clearance])
        {
            difference()
            {
                translate([frame_x_offset, frame_y_offset, 0])
                {
                    rounded_wall(frame_width, frame_height, wall_thickness);
                }

                // Shaft cutouts
                free_shaft_cutout();
                translate([-compound_gear_1_2_dist(), 0, 0])
                {
                    free_shaft_cutout();
                }
            }
        }
    }

    // Middle shaft support wall
    middle_wall_z_offset = (gear_thickness * 4) + gear_wall_clearance * 2;
    module middle_shaft_support_wall()
    {
        translate([0, 0, -middle_wall_z_offset + (wall_thickness / 2)])
        {
            difference()
            {
                translate([frame_x_offset, frame_y_offset, 0])
                {
                    rounded_wall(frame_width, frame_height, wall_thickness);
                }

                // Shaft cutouts
                free_shaft_cutout();
                translate([-compound_gear_1_2_dist() + compound_gear_1_5_dist(), 0, 0])
                {
                    free_shaft_cutout();
                }
                translate([-compound_gear_1_2_dist(), 0, 0])
                {
                    gear_shaft_cutout();
                }
            }
        }
    }

    last_wall_z_offset = (gear_thickness * 8) + gear_wall_clearance * 3;

    module last_shaft_support_wall()
    {
        translate([0, 0, -last_wall_z_offset + (wall_thickness / 2)])
        {
            difference()
            {
                translate([frame_x_offset, frame_y_offset, 0])
                {
                    rounded_wall(frame_width, frame_height, wall_thickness);
                }
                translate([-compound_gear_1_2_dist() + compound_gear_1_5_dist(), 0, 0])
                {
                    gear_shaft_cutout();
                }
                translate([-compound_gear_1_2_dist(), 0, 0])
                {
                    free_shaft_cutout();
                }
            }
        }
    }

    floor_height = 50;
    floor_z_offset = -floor_height + gear_thickness + gear_wall_clearance + wall_thickness;

    module camera_gear_retainer()
    {
        $fn = cylinder_resolution;

        gear_lip_retainer_thickness = 2;
        lip_retainer_width = frame_width - 30;
        lip_retainer_height = frame_height - wall_thickness / 2;
        // + 0.5 for a decent fit
        lip_retainer_thickness = gear_lip_retainer_thickness * 2 + 1.5;

        difference()
        {
            translate([frame_x_offset, frame_y_offset + (wall_thickness / 2), floor_z_offset])
            {
                rounded_wall(lip_retainer_width, lip_retainer_height,
                             lip_retainer_thickness * 2 - wall_thickness / 2);
            }

            translate([-compound_gear_1_2_dist(), 0, floor_z_offset - 1])
            {
                cylinder(r=compound_gear_1_5_dist() - 2, h=20);
            }

            
            translate([-compound_gear_1_2_dist(), 0, floor_z_offset + gear_lip_retainer_thickness - 0.2])
            {
                cylinder(r=compound_gear_1_5_dist(), h=camera_mount_retainer_thickness + 0.75);
            }
        }

    }

    module floor()
    {
        $fn = cylinder_resolution;
        difference()
        {
            union()
            {
                translate([frame_x_offset, frame_y_offset - wall_thickness / 2, floor_z_offset])
                {
                    cube([frame_width, wall_thickness, floor_height]);
                }

                // Mounting block for the stepper motor
                translate([frame_x_offset, frame_y_offset - wall_thickness / 2,
                           -middle_wall_z_offset + wall_thickness])
                {
                    cube([frame_width, wall_thickness * 3, gear_thickness * 13]);
                }
            }

            // Tripod mount assembly through-holes - M4s
            screw_hole_diameter = 4.3;
            translate([0, frame_y_offset + 15, 0])
            {
                inset = 5;
                left = frame_x_offset + inset;
                right = frame_x_offset + frame_width - inset;
                top = floor_z_offset + gear_thickness * 5;
                bottom = 32;

                for(x = [left, right])
                for(z = [top, bottom])
                {
                    translate([x, 0, z])
                    {
                        rotate([90, 0, 0])
                        {
                            cylinder(r=screw_hole_diameter / 2, h=20);
                        }
                    }
                }
            }
        }
    }

    difference()
    {
        union()
        {
            first_shaft_support_wall();
            middle_shaft_support_wall();
            union()
            {
                last_shaft_support_wall();
                camera_gear_retainer();
            }
            floor();
        }

        translate([-stepper_width / 2, stepper_y_offset, -9 - stepper_shaft_diameter / 2])
        {
            rotate([90, 0, 0])
            {
                stepper_motor_mount();
            }
        }
    }
}
